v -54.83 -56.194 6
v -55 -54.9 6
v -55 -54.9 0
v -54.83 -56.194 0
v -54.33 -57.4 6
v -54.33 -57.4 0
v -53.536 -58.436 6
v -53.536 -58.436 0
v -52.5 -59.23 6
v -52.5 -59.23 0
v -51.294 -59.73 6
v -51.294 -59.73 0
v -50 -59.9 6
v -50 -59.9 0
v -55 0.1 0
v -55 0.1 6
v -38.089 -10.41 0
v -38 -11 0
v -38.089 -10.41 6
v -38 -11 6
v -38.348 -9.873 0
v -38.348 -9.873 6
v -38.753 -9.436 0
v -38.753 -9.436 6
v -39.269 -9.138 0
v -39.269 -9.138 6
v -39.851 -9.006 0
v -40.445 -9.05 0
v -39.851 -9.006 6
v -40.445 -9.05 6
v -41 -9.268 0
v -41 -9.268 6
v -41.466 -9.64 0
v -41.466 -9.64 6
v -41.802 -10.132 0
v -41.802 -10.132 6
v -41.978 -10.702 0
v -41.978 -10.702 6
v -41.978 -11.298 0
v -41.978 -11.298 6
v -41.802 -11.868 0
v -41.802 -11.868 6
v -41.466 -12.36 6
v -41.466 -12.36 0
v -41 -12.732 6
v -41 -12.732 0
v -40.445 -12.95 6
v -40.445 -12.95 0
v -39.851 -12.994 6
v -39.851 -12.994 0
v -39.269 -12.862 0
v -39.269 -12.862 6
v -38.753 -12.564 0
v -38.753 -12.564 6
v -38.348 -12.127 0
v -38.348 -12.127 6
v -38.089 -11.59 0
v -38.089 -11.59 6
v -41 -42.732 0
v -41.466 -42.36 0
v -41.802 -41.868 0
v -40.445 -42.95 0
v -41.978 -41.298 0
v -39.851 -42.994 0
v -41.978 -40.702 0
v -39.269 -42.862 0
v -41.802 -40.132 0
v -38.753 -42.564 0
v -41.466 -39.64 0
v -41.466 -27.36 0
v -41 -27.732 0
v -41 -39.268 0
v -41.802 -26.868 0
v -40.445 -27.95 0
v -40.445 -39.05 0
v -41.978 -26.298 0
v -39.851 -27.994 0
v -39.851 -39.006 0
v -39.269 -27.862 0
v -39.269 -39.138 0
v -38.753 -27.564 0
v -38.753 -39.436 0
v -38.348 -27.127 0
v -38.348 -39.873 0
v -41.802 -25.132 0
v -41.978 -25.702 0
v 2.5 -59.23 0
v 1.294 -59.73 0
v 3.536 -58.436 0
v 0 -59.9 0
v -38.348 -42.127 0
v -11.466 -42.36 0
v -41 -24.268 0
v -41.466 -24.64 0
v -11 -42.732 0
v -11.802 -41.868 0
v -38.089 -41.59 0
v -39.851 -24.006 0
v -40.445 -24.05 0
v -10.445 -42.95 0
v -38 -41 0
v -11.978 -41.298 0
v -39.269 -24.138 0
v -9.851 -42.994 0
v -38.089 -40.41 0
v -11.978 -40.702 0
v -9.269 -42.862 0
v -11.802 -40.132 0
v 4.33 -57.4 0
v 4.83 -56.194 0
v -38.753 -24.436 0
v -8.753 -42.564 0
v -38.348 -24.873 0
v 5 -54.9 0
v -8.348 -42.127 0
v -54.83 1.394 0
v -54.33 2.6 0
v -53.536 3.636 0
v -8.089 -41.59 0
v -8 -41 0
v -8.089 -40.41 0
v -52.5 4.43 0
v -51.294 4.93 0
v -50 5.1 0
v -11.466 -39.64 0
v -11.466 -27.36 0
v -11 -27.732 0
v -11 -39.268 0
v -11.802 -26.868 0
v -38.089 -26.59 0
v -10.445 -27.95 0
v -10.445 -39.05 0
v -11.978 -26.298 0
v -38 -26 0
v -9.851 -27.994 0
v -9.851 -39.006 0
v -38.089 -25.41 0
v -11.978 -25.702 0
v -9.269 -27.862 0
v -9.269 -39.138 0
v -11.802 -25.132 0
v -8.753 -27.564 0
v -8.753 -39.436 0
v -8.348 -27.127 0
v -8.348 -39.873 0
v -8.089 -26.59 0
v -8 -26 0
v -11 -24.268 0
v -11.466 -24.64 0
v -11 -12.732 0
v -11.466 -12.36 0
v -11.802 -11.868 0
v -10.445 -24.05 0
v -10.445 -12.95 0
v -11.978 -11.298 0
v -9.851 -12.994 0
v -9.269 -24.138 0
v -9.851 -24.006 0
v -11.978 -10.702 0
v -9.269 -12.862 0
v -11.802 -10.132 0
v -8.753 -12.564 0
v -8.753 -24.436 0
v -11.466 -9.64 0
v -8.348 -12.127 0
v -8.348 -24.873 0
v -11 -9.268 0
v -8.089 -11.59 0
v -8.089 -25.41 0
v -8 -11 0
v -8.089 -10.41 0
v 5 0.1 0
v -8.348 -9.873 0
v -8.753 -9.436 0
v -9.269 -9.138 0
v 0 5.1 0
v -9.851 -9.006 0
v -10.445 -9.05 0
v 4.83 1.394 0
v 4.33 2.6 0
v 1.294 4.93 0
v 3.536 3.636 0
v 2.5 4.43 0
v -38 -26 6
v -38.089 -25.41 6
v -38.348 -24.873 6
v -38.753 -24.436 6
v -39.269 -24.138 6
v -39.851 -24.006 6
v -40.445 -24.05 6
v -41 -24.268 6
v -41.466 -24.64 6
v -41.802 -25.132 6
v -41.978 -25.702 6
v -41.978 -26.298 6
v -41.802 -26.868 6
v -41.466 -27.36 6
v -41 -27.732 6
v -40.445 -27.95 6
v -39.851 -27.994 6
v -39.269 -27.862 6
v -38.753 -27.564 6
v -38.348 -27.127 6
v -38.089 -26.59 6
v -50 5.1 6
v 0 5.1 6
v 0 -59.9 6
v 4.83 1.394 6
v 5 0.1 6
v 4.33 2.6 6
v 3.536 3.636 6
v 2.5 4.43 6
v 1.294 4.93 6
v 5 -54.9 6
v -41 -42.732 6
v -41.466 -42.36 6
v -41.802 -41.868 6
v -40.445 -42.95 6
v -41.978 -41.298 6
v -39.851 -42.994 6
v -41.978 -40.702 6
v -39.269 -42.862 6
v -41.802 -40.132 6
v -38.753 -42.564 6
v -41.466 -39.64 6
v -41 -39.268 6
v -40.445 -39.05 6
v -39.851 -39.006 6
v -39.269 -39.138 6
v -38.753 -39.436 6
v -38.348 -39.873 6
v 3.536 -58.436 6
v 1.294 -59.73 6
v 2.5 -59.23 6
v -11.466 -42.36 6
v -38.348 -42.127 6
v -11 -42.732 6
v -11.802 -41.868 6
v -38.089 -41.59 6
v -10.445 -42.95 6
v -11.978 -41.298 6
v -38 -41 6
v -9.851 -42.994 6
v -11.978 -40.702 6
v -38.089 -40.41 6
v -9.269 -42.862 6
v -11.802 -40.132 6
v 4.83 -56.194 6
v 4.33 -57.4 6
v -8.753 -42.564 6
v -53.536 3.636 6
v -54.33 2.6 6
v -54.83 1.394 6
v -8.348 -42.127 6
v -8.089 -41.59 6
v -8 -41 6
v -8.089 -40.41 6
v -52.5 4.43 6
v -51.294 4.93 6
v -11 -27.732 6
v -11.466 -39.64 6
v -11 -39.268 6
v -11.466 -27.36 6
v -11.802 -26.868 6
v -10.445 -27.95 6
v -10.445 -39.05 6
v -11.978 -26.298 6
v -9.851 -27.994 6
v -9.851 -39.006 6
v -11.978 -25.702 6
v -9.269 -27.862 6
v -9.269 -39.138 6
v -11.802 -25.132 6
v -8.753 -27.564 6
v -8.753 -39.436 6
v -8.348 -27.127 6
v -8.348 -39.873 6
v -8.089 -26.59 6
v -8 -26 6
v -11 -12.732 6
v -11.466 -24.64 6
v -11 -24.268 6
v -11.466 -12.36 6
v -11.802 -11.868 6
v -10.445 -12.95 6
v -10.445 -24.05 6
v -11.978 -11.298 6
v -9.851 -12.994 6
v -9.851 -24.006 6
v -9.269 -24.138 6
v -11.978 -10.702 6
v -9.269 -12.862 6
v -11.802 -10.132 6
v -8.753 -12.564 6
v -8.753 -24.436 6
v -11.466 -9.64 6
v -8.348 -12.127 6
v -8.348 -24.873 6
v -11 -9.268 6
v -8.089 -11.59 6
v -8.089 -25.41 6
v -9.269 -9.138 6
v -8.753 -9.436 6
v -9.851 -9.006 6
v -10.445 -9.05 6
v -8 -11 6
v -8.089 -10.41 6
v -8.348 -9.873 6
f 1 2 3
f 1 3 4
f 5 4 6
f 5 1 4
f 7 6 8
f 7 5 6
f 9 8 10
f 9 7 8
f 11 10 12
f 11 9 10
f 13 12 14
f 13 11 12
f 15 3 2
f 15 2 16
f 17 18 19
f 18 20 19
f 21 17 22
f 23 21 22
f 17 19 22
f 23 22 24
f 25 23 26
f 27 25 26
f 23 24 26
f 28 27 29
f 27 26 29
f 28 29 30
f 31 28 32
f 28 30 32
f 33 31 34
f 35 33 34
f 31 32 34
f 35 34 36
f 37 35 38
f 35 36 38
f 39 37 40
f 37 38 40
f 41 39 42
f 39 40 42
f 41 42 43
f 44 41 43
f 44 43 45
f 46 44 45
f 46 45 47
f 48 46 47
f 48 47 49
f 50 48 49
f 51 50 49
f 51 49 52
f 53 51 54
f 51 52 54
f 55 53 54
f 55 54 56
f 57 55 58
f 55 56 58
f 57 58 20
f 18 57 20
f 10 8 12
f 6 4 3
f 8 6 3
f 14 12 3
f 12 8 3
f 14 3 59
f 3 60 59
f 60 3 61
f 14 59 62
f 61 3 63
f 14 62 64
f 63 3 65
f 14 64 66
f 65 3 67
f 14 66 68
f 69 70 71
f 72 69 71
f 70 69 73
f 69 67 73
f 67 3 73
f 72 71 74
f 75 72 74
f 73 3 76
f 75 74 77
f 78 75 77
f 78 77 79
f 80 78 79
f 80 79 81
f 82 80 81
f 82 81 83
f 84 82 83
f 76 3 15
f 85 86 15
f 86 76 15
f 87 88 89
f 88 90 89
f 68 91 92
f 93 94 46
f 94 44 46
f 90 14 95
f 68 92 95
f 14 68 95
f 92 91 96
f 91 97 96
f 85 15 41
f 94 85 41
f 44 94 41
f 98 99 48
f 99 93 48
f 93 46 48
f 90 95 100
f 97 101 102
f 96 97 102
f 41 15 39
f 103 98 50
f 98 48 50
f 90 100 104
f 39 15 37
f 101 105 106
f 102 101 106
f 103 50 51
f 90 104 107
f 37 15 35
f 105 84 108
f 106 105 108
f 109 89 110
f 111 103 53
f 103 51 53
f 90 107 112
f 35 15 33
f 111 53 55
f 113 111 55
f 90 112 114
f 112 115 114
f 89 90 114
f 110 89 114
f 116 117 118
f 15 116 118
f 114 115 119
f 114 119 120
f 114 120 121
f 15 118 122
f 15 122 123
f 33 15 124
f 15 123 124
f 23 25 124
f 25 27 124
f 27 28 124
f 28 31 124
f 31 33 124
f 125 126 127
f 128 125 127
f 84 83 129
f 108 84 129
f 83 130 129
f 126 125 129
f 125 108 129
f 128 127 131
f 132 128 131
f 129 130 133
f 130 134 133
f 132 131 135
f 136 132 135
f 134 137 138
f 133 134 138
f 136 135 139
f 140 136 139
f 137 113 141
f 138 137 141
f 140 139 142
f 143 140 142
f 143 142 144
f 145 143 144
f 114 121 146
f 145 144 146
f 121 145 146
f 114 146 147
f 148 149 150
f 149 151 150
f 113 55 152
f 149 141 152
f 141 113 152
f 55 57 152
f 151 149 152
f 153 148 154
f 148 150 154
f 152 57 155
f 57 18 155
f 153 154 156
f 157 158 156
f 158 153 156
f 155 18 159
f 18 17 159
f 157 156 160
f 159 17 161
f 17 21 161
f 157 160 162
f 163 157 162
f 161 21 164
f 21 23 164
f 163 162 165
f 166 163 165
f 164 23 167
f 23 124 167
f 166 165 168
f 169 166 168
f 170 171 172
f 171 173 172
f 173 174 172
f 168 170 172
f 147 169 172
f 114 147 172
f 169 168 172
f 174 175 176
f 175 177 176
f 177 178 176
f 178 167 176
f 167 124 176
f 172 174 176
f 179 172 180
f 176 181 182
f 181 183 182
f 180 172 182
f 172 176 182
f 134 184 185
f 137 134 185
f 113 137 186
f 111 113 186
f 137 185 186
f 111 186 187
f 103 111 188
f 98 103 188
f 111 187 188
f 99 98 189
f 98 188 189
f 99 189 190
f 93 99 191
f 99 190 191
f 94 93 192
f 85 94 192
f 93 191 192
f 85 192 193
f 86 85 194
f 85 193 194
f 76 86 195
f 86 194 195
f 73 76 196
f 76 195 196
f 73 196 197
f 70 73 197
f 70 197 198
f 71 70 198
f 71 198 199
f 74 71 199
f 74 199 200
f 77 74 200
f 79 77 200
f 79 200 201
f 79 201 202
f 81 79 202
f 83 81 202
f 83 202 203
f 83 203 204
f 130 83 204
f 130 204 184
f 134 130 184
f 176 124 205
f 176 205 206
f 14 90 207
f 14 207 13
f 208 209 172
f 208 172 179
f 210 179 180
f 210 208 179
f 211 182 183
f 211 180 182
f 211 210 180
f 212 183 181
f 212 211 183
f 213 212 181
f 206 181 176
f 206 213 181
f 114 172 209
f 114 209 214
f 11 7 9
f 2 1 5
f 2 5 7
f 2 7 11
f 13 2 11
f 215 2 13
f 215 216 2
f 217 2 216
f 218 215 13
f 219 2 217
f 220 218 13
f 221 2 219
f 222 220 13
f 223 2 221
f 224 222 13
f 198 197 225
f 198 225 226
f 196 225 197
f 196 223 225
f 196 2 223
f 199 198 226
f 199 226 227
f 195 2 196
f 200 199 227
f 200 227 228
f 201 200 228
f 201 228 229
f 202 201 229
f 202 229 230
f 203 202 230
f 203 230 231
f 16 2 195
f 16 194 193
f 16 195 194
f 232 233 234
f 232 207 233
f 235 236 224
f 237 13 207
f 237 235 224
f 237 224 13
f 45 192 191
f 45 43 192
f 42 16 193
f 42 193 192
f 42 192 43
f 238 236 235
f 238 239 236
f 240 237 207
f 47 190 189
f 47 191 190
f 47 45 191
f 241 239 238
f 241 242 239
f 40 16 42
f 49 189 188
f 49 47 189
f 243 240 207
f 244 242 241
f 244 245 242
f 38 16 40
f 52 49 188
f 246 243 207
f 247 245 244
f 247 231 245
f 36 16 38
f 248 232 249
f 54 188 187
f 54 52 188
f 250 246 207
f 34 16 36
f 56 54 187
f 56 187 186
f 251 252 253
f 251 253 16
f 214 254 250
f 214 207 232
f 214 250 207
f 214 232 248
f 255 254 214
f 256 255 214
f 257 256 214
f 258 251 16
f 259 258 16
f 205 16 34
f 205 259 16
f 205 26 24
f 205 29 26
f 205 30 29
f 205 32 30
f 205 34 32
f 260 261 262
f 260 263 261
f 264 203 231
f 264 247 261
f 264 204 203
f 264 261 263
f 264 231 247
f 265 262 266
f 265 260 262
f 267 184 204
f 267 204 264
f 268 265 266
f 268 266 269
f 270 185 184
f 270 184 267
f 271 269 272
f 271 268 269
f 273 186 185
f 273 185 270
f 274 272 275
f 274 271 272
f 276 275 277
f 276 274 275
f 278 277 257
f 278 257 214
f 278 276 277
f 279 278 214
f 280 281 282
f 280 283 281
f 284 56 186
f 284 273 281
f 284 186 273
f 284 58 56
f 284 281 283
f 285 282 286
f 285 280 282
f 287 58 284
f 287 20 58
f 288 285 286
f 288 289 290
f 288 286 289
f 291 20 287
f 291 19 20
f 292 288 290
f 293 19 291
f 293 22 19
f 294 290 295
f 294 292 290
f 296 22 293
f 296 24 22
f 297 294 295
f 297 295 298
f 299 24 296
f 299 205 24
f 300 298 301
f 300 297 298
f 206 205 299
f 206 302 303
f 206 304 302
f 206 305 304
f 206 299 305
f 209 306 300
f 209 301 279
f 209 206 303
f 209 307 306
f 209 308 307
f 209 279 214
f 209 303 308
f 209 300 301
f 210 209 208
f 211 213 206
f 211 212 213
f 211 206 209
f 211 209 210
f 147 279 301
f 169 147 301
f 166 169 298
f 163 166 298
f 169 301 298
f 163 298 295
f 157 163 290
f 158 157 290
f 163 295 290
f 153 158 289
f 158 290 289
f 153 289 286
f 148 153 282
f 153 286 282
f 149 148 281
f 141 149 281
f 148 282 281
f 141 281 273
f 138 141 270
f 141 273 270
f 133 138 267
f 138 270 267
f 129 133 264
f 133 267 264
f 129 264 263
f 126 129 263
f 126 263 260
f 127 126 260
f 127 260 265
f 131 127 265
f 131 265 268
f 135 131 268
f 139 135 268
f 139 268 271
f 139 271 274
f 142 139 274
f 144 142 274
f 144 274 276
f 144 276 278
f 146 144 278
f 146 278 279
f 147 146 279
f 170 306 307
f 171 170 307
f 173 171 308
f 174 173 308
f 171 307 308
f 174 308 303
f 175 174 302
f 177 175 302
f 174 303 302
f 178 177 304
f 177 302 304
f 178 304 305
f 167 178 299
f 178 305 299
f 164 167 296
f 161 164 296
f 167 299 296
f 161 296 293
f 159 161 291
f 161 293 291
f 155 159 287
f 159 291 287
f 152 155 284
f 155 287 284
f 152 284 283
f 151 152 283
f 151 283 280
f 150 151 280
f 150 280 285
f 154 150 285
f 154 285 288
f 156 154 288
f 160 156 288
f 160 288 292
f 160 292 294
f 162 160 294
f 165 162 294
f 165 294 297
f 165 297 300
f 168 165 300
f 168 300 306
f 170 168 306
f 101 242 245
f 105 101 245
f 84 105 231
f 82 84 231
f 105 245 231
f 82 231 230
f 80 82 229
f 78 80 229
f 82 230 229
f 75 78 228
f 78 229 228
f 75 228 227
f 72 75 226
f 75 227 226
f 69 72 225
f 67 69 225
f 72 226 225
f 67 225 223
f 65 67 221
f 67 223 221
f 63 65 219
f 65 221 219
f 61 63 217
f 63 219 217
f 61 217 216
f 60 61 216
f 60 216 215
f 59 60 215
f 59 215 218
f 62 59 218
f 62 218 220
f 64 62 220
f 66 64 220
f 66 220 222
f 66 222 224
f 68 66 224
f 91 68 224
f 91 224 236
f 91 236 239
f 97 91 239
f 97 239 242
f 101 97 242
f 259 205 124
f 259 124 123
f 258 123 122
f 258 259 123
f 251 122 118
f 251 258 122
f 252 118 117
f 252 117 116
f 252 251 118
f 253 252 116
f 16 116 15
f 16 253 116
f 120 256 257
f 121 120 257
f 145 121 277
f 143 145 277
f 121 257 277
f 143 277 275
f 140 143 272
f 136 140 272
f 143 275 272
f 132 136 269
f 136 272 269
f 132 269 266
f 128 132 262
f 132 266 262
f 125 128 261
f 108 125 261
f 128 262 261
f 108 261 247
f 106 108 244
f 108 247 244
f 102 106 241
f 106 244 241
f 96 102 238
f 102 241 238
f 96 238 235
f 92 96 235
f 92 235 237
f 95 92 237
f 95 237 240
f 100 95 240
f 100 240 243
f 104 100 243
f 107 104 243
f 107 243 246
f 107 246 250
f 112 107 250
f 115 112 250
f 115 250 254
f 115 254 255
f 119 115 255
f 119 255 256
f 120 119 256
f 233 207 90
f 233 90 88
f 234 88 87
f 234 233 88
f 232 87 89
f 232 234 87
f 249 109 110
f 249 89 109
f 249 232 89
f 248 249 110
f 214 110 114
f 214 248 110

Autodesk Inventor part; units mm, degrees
ref_plane "YZ Plane" through (0, 0, 0) normal (1, 0, 0) x (0, 1, 0)
ref_plane "XZ Plane" through (0, 0, 0) normal (0, 1, 0) x (-1, 0, 0)
ref_plane "XY Plane" through (0, 0, 0) normal (0, 0, 1) x (1, 0, 0)
sketch "Sketch1" plane through (0, 0, 0) normal (0, 0, 1) x (1, 0, 0)
  line L0 (0, -5.0856) -> (0, -49.3) projected
  line L1 (0, -54.8) -> (-50, -54.8) projected
  line L2 (-50, -5.0856) -> (-50, -49.3) projected
  line L3 (-5.3931, 0) -> (-44.6069, 0) projected
  line L4 (-50, -27.1928) -> (0, -27.1928) construction
  line L5 (-25, 0) -> (-25, -54.8) construction
  line L6 (-55, 5.1) -> (5, 5.1)
  line L7 (5, 5.1) -> (5, -59.9)
  line L8 (5, -59.9) -> (-55, -59.9)
  line L9 (-55, -59.9) -> (-55, 5.1)
  line L10 (-55, 5.1) -> (5, -59.9) construction
  line L11 (5, 5.1) -> (-55, -59.9) construction
  point P0 (0, 0)
  point P1 (-25, -27.4)
  dimension "d0" = 60
  dimension "d1" = 65
extrude "Extrusion1" add sketch "Sketch1" along normal blind 6
sketch "Sketch2" plane through (0, 0, 6) normal (0, 0, 1) x (1, 0, 0)
  circle A0 centre (-40, -11) radius 2 projected
  circle A1 centre (-40, -26) radius 2 projected
  circle A2 centre (-40, -41) radius 2 projected
  circle A3 centre (-10, -41) radius 2 projected
  circle A4 centre (-10, -26) radius 2 projected
  circle A5 centre (-10, -11) radius 2 projected
  point P0 (0, 0)
extrude "Extrusion2" cut sketch "Sketch2" against normal blind 6
fillet "Fillet1" radius 5 4 edges at (-55, -59.9, 3) (-55, 5.1, 3) (5, -59.9, 3) (5, 5.1, 3)
properties part number "Wheel height spacers"
